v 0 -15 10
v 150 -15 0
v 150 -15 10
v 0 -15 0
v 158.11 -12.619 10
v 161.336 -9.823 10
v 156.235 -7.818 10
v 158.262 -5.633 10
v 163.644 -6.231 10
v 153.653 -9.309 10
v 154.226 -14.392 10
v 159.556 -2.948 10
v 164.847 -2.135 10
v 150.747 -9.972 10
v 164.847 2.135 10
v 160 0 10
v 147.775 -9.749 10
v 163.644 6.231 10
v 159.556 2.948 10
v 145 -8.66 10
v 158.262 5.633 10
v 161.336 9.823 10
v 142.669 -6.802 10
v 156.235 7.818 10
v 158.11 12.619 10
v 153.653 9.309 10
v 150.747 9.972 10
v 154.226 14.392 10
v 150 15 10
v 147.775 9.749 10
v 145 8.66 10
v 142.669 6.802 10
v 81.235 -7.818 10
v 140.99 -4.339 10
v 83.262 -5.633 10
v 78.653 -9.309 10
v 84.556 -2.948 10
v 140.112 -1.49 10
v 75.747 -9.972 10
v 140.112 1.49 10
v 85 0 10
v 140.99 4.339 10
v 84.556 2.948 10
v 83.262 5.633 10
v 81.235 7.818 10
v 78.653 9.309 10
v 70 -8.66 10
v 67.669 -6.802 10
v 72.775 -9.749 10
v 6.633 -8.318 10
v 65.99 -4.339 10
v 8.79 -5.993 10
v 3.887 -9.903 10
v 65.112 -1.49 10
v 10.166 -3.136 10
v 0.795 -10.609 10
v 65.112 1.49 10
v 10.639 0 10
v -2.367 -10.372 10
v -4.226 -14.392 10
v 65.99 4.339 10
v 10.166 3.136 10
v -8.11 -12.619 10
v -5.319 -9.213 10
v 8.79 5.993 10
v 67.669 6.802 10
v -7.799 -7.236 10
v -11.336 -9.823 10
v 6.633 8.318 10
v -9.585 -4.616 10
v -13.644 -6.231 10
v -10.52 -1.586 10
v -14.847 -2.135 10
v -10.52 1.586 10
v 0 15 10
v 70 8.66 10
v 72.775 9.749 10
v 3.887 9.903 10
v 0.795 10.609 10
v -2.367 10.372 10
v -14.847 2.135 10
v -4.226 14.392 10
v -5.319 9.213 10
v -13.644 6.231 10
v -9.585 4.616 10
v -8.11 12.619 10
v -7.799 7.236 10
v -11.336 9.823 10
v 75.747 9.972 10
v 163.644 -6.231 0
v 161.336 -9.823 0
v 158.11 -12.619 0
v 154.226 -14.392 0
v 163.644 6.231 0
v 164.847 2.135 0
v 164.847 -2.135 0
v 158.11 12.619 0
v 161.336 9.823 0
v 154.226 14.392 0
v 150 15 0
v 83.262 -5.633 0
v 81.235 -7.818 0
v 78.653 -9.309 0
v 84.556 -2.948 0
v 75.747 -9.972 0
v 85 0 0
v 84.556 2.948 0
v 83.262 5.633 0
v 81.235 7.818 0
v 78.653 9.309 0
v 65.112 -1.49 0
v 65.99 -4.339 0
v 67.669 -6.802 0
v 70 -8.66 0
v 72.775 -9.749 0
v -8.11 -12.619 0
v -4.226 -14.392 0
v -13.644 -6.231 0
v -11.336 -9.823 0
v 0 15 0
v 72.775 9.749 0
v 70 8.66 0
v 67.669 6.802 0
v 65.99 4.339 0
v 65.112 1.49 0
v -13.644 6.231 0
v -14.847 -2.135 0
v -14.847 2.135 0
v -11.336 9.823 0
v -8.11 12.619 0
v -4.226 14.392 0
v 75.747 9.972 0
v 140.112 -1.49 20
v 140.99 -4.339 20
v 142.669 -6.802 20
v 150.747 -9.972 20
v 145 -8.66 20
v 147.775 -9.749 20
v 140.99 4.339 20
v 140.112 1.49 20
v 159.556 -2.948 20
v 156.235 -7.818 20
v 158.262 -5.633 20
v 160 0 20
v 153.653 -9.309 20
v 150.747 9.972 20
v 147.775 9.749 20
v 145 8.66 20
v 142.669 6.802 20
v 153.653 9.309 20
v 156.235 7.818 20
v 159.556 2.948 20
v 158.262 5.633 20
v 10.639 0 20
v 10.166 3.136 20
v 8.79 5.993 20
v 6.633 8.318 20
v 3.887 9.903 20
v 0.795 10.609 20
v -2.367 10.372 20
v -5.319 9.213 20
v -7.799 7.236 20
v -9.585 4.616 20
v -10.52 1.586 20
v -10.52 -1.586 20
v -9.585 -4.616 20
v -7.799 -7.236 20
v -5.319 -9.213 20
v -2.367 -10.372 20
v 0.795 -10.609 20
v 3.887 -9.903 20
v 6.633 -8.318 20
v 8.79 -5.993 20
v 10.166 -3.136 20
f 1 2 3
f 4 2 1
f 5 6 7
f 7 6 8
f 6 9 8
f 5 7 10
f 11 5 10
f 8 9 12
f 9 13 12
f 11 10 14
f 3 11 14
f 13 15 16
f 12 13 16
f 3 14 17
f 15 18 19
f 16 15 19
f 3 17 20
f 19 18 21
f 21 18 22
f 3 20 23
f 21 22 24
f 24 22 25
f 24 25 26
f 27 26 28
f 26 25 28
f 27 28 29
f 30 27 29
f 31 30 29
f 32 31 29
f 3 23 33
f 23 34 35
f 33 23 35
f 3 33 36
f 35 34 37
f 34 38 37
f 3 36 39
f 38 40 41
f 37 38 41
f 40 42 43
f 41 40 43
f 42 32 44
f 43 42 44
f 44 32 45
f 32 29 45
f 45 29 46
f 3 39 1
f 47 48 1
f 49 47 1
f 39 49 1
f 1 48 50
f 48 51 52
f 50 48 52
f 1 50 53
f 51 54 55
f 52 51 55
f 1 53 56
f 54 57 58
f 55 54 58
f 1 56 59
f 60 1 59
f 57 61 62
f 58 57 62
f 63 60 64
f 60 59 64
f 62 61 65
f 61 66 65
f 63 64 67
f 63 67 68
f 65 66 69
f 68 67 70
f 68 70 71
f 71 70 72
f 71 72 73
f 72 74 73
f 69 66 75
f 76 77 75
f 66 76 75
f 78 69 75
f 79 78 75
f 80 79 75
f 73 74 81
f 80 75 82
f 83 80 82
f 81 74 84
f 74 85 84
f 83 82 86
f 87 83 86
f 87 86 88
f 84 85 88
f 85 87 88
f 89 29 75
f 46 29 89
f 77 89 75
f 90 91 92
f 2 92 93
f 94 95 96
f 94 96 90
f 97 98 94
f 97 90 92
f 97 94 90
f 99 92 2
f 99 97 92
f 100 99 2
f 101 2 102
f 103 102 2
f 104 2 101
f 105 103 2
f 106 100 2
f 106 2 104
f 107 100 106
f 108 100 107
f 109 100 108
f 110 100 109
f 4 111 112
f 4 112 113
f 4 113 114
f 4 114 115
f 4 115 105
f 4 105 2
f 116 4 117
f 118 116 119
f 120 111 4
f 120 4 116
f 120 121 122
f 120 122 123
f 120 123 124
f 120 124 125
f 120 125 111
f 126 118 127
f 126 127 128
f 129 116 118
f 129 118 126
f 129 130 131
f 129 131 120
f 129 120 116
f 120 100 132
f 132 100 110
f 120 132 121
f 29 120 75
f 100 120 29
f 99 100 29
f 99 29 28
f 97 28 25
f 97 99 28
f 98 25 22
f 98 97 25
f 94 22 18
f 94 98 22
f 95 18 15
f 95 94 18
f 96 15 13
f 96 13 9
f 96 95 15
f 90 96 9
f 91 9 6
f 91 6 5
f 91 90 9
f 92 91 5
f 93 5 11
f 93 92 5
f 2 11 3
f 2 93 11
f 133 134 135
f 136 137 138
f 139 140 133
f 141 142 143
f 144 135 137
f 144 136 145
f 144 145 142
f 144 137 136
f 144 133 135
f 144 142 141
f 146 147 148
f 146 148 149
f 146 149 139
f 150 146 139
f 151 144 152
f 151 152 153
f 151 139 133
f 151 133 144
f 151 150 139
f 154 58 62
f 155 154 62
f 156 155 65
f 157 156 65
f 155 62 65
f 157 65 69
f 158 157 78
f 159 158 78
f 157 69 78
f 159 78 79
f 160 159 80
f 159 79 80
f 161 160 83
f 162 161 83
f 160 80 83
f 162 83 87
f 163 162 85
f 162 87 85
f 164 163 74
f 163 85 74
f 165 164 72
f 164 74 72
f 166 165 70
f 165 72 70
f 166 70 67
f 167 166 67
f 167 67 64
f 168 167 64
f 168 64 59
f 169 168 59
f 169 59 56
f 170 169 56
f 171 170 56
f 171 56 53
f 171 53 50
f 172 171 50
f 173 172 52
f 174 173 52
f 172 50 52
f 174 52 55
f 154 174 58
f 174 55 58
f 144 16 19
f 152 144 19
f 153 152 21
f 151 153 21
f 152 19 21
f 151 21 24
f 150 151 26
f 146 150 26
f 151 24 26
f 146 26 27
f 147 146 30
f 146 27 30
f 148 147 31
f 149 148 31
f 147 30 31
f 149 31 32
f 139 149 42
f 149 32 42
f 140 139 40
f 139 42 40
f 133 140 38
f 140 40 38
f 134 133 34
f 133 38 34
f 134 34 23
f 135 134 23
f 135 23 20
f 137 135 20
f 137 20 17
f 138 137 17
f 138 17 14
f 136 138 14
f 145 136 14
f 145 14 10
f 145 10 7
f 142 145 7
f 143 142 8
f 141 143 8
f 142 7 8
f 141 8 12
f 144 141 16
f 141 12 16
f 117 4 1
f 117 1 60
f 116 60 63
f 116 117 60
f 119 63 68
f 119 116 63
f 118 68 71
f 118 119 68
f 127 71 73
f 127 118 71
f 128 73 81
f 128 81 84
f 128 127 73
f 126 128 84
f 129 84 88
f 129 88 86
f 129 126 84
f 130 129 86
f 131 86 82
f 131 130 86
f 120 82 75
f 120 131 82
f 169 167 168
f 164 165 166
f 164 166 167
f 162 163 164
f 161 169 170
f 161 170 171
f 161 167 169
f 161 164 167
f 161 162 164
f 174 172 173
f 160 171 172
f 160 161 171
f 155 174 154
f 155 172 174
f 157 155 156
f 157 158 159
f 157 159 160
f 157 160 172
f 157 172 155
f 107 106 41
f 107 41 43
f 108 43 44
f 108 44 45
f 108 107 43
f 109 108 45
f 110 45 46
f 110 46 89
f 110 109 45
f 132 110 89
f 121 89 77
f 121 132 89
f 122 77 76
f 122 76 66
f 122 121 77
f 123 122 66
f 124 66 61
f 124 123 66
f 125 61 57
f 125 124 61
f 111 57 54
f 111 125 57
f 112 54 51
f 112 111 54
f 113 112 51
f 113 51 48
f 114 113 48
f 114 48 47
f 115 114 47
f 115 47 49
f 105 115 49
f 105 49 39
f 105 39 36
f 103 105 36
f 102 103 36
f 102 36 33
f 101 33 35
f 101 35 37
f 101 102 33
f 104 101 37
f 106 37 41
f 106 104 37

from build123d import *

# Parameters (mm, degrees)
SKETCH1_R           = 10
BOSS_EXTRUDE1_DEPTH = 10
SKETCH2_R           = 10.638632356
SKETCH2_R_2         = 10
BOSS_EXTRUDE2_DEPTH = 10


with BuildPart() as part:
    # Sketch1 → Boss-Extrude1 (new body)
    with BuildSketch(Plane.XY):
        with BuildLine():
            Line((0, 15), (150, 15))
            ThreePointArc((150, 15), (165, 0), (150, -15))
            Line((150, -15), (0, -15))
            ThreePointArc((0, -15), (-15, 0), (0, 15))
        make_face()
        with Locations((75, 0)):
            Circle(SKETCH1_R, mode=Mode.SUBTRACT)
    extrude(amount=BOSS_EXTRUDE1_DEPTH)

    # Sketch2 → Boss-Extrude2 (add)
    with BuildSketch(Plane.XY.offset(10)):
        Circle(SKETCH2_R)
        with Locations((150, 0)):
            Circle(SKETCH2_R_2)
    extrude(amount=BOSS_EXTRUDE2_DEPTH)


solid = part.part
